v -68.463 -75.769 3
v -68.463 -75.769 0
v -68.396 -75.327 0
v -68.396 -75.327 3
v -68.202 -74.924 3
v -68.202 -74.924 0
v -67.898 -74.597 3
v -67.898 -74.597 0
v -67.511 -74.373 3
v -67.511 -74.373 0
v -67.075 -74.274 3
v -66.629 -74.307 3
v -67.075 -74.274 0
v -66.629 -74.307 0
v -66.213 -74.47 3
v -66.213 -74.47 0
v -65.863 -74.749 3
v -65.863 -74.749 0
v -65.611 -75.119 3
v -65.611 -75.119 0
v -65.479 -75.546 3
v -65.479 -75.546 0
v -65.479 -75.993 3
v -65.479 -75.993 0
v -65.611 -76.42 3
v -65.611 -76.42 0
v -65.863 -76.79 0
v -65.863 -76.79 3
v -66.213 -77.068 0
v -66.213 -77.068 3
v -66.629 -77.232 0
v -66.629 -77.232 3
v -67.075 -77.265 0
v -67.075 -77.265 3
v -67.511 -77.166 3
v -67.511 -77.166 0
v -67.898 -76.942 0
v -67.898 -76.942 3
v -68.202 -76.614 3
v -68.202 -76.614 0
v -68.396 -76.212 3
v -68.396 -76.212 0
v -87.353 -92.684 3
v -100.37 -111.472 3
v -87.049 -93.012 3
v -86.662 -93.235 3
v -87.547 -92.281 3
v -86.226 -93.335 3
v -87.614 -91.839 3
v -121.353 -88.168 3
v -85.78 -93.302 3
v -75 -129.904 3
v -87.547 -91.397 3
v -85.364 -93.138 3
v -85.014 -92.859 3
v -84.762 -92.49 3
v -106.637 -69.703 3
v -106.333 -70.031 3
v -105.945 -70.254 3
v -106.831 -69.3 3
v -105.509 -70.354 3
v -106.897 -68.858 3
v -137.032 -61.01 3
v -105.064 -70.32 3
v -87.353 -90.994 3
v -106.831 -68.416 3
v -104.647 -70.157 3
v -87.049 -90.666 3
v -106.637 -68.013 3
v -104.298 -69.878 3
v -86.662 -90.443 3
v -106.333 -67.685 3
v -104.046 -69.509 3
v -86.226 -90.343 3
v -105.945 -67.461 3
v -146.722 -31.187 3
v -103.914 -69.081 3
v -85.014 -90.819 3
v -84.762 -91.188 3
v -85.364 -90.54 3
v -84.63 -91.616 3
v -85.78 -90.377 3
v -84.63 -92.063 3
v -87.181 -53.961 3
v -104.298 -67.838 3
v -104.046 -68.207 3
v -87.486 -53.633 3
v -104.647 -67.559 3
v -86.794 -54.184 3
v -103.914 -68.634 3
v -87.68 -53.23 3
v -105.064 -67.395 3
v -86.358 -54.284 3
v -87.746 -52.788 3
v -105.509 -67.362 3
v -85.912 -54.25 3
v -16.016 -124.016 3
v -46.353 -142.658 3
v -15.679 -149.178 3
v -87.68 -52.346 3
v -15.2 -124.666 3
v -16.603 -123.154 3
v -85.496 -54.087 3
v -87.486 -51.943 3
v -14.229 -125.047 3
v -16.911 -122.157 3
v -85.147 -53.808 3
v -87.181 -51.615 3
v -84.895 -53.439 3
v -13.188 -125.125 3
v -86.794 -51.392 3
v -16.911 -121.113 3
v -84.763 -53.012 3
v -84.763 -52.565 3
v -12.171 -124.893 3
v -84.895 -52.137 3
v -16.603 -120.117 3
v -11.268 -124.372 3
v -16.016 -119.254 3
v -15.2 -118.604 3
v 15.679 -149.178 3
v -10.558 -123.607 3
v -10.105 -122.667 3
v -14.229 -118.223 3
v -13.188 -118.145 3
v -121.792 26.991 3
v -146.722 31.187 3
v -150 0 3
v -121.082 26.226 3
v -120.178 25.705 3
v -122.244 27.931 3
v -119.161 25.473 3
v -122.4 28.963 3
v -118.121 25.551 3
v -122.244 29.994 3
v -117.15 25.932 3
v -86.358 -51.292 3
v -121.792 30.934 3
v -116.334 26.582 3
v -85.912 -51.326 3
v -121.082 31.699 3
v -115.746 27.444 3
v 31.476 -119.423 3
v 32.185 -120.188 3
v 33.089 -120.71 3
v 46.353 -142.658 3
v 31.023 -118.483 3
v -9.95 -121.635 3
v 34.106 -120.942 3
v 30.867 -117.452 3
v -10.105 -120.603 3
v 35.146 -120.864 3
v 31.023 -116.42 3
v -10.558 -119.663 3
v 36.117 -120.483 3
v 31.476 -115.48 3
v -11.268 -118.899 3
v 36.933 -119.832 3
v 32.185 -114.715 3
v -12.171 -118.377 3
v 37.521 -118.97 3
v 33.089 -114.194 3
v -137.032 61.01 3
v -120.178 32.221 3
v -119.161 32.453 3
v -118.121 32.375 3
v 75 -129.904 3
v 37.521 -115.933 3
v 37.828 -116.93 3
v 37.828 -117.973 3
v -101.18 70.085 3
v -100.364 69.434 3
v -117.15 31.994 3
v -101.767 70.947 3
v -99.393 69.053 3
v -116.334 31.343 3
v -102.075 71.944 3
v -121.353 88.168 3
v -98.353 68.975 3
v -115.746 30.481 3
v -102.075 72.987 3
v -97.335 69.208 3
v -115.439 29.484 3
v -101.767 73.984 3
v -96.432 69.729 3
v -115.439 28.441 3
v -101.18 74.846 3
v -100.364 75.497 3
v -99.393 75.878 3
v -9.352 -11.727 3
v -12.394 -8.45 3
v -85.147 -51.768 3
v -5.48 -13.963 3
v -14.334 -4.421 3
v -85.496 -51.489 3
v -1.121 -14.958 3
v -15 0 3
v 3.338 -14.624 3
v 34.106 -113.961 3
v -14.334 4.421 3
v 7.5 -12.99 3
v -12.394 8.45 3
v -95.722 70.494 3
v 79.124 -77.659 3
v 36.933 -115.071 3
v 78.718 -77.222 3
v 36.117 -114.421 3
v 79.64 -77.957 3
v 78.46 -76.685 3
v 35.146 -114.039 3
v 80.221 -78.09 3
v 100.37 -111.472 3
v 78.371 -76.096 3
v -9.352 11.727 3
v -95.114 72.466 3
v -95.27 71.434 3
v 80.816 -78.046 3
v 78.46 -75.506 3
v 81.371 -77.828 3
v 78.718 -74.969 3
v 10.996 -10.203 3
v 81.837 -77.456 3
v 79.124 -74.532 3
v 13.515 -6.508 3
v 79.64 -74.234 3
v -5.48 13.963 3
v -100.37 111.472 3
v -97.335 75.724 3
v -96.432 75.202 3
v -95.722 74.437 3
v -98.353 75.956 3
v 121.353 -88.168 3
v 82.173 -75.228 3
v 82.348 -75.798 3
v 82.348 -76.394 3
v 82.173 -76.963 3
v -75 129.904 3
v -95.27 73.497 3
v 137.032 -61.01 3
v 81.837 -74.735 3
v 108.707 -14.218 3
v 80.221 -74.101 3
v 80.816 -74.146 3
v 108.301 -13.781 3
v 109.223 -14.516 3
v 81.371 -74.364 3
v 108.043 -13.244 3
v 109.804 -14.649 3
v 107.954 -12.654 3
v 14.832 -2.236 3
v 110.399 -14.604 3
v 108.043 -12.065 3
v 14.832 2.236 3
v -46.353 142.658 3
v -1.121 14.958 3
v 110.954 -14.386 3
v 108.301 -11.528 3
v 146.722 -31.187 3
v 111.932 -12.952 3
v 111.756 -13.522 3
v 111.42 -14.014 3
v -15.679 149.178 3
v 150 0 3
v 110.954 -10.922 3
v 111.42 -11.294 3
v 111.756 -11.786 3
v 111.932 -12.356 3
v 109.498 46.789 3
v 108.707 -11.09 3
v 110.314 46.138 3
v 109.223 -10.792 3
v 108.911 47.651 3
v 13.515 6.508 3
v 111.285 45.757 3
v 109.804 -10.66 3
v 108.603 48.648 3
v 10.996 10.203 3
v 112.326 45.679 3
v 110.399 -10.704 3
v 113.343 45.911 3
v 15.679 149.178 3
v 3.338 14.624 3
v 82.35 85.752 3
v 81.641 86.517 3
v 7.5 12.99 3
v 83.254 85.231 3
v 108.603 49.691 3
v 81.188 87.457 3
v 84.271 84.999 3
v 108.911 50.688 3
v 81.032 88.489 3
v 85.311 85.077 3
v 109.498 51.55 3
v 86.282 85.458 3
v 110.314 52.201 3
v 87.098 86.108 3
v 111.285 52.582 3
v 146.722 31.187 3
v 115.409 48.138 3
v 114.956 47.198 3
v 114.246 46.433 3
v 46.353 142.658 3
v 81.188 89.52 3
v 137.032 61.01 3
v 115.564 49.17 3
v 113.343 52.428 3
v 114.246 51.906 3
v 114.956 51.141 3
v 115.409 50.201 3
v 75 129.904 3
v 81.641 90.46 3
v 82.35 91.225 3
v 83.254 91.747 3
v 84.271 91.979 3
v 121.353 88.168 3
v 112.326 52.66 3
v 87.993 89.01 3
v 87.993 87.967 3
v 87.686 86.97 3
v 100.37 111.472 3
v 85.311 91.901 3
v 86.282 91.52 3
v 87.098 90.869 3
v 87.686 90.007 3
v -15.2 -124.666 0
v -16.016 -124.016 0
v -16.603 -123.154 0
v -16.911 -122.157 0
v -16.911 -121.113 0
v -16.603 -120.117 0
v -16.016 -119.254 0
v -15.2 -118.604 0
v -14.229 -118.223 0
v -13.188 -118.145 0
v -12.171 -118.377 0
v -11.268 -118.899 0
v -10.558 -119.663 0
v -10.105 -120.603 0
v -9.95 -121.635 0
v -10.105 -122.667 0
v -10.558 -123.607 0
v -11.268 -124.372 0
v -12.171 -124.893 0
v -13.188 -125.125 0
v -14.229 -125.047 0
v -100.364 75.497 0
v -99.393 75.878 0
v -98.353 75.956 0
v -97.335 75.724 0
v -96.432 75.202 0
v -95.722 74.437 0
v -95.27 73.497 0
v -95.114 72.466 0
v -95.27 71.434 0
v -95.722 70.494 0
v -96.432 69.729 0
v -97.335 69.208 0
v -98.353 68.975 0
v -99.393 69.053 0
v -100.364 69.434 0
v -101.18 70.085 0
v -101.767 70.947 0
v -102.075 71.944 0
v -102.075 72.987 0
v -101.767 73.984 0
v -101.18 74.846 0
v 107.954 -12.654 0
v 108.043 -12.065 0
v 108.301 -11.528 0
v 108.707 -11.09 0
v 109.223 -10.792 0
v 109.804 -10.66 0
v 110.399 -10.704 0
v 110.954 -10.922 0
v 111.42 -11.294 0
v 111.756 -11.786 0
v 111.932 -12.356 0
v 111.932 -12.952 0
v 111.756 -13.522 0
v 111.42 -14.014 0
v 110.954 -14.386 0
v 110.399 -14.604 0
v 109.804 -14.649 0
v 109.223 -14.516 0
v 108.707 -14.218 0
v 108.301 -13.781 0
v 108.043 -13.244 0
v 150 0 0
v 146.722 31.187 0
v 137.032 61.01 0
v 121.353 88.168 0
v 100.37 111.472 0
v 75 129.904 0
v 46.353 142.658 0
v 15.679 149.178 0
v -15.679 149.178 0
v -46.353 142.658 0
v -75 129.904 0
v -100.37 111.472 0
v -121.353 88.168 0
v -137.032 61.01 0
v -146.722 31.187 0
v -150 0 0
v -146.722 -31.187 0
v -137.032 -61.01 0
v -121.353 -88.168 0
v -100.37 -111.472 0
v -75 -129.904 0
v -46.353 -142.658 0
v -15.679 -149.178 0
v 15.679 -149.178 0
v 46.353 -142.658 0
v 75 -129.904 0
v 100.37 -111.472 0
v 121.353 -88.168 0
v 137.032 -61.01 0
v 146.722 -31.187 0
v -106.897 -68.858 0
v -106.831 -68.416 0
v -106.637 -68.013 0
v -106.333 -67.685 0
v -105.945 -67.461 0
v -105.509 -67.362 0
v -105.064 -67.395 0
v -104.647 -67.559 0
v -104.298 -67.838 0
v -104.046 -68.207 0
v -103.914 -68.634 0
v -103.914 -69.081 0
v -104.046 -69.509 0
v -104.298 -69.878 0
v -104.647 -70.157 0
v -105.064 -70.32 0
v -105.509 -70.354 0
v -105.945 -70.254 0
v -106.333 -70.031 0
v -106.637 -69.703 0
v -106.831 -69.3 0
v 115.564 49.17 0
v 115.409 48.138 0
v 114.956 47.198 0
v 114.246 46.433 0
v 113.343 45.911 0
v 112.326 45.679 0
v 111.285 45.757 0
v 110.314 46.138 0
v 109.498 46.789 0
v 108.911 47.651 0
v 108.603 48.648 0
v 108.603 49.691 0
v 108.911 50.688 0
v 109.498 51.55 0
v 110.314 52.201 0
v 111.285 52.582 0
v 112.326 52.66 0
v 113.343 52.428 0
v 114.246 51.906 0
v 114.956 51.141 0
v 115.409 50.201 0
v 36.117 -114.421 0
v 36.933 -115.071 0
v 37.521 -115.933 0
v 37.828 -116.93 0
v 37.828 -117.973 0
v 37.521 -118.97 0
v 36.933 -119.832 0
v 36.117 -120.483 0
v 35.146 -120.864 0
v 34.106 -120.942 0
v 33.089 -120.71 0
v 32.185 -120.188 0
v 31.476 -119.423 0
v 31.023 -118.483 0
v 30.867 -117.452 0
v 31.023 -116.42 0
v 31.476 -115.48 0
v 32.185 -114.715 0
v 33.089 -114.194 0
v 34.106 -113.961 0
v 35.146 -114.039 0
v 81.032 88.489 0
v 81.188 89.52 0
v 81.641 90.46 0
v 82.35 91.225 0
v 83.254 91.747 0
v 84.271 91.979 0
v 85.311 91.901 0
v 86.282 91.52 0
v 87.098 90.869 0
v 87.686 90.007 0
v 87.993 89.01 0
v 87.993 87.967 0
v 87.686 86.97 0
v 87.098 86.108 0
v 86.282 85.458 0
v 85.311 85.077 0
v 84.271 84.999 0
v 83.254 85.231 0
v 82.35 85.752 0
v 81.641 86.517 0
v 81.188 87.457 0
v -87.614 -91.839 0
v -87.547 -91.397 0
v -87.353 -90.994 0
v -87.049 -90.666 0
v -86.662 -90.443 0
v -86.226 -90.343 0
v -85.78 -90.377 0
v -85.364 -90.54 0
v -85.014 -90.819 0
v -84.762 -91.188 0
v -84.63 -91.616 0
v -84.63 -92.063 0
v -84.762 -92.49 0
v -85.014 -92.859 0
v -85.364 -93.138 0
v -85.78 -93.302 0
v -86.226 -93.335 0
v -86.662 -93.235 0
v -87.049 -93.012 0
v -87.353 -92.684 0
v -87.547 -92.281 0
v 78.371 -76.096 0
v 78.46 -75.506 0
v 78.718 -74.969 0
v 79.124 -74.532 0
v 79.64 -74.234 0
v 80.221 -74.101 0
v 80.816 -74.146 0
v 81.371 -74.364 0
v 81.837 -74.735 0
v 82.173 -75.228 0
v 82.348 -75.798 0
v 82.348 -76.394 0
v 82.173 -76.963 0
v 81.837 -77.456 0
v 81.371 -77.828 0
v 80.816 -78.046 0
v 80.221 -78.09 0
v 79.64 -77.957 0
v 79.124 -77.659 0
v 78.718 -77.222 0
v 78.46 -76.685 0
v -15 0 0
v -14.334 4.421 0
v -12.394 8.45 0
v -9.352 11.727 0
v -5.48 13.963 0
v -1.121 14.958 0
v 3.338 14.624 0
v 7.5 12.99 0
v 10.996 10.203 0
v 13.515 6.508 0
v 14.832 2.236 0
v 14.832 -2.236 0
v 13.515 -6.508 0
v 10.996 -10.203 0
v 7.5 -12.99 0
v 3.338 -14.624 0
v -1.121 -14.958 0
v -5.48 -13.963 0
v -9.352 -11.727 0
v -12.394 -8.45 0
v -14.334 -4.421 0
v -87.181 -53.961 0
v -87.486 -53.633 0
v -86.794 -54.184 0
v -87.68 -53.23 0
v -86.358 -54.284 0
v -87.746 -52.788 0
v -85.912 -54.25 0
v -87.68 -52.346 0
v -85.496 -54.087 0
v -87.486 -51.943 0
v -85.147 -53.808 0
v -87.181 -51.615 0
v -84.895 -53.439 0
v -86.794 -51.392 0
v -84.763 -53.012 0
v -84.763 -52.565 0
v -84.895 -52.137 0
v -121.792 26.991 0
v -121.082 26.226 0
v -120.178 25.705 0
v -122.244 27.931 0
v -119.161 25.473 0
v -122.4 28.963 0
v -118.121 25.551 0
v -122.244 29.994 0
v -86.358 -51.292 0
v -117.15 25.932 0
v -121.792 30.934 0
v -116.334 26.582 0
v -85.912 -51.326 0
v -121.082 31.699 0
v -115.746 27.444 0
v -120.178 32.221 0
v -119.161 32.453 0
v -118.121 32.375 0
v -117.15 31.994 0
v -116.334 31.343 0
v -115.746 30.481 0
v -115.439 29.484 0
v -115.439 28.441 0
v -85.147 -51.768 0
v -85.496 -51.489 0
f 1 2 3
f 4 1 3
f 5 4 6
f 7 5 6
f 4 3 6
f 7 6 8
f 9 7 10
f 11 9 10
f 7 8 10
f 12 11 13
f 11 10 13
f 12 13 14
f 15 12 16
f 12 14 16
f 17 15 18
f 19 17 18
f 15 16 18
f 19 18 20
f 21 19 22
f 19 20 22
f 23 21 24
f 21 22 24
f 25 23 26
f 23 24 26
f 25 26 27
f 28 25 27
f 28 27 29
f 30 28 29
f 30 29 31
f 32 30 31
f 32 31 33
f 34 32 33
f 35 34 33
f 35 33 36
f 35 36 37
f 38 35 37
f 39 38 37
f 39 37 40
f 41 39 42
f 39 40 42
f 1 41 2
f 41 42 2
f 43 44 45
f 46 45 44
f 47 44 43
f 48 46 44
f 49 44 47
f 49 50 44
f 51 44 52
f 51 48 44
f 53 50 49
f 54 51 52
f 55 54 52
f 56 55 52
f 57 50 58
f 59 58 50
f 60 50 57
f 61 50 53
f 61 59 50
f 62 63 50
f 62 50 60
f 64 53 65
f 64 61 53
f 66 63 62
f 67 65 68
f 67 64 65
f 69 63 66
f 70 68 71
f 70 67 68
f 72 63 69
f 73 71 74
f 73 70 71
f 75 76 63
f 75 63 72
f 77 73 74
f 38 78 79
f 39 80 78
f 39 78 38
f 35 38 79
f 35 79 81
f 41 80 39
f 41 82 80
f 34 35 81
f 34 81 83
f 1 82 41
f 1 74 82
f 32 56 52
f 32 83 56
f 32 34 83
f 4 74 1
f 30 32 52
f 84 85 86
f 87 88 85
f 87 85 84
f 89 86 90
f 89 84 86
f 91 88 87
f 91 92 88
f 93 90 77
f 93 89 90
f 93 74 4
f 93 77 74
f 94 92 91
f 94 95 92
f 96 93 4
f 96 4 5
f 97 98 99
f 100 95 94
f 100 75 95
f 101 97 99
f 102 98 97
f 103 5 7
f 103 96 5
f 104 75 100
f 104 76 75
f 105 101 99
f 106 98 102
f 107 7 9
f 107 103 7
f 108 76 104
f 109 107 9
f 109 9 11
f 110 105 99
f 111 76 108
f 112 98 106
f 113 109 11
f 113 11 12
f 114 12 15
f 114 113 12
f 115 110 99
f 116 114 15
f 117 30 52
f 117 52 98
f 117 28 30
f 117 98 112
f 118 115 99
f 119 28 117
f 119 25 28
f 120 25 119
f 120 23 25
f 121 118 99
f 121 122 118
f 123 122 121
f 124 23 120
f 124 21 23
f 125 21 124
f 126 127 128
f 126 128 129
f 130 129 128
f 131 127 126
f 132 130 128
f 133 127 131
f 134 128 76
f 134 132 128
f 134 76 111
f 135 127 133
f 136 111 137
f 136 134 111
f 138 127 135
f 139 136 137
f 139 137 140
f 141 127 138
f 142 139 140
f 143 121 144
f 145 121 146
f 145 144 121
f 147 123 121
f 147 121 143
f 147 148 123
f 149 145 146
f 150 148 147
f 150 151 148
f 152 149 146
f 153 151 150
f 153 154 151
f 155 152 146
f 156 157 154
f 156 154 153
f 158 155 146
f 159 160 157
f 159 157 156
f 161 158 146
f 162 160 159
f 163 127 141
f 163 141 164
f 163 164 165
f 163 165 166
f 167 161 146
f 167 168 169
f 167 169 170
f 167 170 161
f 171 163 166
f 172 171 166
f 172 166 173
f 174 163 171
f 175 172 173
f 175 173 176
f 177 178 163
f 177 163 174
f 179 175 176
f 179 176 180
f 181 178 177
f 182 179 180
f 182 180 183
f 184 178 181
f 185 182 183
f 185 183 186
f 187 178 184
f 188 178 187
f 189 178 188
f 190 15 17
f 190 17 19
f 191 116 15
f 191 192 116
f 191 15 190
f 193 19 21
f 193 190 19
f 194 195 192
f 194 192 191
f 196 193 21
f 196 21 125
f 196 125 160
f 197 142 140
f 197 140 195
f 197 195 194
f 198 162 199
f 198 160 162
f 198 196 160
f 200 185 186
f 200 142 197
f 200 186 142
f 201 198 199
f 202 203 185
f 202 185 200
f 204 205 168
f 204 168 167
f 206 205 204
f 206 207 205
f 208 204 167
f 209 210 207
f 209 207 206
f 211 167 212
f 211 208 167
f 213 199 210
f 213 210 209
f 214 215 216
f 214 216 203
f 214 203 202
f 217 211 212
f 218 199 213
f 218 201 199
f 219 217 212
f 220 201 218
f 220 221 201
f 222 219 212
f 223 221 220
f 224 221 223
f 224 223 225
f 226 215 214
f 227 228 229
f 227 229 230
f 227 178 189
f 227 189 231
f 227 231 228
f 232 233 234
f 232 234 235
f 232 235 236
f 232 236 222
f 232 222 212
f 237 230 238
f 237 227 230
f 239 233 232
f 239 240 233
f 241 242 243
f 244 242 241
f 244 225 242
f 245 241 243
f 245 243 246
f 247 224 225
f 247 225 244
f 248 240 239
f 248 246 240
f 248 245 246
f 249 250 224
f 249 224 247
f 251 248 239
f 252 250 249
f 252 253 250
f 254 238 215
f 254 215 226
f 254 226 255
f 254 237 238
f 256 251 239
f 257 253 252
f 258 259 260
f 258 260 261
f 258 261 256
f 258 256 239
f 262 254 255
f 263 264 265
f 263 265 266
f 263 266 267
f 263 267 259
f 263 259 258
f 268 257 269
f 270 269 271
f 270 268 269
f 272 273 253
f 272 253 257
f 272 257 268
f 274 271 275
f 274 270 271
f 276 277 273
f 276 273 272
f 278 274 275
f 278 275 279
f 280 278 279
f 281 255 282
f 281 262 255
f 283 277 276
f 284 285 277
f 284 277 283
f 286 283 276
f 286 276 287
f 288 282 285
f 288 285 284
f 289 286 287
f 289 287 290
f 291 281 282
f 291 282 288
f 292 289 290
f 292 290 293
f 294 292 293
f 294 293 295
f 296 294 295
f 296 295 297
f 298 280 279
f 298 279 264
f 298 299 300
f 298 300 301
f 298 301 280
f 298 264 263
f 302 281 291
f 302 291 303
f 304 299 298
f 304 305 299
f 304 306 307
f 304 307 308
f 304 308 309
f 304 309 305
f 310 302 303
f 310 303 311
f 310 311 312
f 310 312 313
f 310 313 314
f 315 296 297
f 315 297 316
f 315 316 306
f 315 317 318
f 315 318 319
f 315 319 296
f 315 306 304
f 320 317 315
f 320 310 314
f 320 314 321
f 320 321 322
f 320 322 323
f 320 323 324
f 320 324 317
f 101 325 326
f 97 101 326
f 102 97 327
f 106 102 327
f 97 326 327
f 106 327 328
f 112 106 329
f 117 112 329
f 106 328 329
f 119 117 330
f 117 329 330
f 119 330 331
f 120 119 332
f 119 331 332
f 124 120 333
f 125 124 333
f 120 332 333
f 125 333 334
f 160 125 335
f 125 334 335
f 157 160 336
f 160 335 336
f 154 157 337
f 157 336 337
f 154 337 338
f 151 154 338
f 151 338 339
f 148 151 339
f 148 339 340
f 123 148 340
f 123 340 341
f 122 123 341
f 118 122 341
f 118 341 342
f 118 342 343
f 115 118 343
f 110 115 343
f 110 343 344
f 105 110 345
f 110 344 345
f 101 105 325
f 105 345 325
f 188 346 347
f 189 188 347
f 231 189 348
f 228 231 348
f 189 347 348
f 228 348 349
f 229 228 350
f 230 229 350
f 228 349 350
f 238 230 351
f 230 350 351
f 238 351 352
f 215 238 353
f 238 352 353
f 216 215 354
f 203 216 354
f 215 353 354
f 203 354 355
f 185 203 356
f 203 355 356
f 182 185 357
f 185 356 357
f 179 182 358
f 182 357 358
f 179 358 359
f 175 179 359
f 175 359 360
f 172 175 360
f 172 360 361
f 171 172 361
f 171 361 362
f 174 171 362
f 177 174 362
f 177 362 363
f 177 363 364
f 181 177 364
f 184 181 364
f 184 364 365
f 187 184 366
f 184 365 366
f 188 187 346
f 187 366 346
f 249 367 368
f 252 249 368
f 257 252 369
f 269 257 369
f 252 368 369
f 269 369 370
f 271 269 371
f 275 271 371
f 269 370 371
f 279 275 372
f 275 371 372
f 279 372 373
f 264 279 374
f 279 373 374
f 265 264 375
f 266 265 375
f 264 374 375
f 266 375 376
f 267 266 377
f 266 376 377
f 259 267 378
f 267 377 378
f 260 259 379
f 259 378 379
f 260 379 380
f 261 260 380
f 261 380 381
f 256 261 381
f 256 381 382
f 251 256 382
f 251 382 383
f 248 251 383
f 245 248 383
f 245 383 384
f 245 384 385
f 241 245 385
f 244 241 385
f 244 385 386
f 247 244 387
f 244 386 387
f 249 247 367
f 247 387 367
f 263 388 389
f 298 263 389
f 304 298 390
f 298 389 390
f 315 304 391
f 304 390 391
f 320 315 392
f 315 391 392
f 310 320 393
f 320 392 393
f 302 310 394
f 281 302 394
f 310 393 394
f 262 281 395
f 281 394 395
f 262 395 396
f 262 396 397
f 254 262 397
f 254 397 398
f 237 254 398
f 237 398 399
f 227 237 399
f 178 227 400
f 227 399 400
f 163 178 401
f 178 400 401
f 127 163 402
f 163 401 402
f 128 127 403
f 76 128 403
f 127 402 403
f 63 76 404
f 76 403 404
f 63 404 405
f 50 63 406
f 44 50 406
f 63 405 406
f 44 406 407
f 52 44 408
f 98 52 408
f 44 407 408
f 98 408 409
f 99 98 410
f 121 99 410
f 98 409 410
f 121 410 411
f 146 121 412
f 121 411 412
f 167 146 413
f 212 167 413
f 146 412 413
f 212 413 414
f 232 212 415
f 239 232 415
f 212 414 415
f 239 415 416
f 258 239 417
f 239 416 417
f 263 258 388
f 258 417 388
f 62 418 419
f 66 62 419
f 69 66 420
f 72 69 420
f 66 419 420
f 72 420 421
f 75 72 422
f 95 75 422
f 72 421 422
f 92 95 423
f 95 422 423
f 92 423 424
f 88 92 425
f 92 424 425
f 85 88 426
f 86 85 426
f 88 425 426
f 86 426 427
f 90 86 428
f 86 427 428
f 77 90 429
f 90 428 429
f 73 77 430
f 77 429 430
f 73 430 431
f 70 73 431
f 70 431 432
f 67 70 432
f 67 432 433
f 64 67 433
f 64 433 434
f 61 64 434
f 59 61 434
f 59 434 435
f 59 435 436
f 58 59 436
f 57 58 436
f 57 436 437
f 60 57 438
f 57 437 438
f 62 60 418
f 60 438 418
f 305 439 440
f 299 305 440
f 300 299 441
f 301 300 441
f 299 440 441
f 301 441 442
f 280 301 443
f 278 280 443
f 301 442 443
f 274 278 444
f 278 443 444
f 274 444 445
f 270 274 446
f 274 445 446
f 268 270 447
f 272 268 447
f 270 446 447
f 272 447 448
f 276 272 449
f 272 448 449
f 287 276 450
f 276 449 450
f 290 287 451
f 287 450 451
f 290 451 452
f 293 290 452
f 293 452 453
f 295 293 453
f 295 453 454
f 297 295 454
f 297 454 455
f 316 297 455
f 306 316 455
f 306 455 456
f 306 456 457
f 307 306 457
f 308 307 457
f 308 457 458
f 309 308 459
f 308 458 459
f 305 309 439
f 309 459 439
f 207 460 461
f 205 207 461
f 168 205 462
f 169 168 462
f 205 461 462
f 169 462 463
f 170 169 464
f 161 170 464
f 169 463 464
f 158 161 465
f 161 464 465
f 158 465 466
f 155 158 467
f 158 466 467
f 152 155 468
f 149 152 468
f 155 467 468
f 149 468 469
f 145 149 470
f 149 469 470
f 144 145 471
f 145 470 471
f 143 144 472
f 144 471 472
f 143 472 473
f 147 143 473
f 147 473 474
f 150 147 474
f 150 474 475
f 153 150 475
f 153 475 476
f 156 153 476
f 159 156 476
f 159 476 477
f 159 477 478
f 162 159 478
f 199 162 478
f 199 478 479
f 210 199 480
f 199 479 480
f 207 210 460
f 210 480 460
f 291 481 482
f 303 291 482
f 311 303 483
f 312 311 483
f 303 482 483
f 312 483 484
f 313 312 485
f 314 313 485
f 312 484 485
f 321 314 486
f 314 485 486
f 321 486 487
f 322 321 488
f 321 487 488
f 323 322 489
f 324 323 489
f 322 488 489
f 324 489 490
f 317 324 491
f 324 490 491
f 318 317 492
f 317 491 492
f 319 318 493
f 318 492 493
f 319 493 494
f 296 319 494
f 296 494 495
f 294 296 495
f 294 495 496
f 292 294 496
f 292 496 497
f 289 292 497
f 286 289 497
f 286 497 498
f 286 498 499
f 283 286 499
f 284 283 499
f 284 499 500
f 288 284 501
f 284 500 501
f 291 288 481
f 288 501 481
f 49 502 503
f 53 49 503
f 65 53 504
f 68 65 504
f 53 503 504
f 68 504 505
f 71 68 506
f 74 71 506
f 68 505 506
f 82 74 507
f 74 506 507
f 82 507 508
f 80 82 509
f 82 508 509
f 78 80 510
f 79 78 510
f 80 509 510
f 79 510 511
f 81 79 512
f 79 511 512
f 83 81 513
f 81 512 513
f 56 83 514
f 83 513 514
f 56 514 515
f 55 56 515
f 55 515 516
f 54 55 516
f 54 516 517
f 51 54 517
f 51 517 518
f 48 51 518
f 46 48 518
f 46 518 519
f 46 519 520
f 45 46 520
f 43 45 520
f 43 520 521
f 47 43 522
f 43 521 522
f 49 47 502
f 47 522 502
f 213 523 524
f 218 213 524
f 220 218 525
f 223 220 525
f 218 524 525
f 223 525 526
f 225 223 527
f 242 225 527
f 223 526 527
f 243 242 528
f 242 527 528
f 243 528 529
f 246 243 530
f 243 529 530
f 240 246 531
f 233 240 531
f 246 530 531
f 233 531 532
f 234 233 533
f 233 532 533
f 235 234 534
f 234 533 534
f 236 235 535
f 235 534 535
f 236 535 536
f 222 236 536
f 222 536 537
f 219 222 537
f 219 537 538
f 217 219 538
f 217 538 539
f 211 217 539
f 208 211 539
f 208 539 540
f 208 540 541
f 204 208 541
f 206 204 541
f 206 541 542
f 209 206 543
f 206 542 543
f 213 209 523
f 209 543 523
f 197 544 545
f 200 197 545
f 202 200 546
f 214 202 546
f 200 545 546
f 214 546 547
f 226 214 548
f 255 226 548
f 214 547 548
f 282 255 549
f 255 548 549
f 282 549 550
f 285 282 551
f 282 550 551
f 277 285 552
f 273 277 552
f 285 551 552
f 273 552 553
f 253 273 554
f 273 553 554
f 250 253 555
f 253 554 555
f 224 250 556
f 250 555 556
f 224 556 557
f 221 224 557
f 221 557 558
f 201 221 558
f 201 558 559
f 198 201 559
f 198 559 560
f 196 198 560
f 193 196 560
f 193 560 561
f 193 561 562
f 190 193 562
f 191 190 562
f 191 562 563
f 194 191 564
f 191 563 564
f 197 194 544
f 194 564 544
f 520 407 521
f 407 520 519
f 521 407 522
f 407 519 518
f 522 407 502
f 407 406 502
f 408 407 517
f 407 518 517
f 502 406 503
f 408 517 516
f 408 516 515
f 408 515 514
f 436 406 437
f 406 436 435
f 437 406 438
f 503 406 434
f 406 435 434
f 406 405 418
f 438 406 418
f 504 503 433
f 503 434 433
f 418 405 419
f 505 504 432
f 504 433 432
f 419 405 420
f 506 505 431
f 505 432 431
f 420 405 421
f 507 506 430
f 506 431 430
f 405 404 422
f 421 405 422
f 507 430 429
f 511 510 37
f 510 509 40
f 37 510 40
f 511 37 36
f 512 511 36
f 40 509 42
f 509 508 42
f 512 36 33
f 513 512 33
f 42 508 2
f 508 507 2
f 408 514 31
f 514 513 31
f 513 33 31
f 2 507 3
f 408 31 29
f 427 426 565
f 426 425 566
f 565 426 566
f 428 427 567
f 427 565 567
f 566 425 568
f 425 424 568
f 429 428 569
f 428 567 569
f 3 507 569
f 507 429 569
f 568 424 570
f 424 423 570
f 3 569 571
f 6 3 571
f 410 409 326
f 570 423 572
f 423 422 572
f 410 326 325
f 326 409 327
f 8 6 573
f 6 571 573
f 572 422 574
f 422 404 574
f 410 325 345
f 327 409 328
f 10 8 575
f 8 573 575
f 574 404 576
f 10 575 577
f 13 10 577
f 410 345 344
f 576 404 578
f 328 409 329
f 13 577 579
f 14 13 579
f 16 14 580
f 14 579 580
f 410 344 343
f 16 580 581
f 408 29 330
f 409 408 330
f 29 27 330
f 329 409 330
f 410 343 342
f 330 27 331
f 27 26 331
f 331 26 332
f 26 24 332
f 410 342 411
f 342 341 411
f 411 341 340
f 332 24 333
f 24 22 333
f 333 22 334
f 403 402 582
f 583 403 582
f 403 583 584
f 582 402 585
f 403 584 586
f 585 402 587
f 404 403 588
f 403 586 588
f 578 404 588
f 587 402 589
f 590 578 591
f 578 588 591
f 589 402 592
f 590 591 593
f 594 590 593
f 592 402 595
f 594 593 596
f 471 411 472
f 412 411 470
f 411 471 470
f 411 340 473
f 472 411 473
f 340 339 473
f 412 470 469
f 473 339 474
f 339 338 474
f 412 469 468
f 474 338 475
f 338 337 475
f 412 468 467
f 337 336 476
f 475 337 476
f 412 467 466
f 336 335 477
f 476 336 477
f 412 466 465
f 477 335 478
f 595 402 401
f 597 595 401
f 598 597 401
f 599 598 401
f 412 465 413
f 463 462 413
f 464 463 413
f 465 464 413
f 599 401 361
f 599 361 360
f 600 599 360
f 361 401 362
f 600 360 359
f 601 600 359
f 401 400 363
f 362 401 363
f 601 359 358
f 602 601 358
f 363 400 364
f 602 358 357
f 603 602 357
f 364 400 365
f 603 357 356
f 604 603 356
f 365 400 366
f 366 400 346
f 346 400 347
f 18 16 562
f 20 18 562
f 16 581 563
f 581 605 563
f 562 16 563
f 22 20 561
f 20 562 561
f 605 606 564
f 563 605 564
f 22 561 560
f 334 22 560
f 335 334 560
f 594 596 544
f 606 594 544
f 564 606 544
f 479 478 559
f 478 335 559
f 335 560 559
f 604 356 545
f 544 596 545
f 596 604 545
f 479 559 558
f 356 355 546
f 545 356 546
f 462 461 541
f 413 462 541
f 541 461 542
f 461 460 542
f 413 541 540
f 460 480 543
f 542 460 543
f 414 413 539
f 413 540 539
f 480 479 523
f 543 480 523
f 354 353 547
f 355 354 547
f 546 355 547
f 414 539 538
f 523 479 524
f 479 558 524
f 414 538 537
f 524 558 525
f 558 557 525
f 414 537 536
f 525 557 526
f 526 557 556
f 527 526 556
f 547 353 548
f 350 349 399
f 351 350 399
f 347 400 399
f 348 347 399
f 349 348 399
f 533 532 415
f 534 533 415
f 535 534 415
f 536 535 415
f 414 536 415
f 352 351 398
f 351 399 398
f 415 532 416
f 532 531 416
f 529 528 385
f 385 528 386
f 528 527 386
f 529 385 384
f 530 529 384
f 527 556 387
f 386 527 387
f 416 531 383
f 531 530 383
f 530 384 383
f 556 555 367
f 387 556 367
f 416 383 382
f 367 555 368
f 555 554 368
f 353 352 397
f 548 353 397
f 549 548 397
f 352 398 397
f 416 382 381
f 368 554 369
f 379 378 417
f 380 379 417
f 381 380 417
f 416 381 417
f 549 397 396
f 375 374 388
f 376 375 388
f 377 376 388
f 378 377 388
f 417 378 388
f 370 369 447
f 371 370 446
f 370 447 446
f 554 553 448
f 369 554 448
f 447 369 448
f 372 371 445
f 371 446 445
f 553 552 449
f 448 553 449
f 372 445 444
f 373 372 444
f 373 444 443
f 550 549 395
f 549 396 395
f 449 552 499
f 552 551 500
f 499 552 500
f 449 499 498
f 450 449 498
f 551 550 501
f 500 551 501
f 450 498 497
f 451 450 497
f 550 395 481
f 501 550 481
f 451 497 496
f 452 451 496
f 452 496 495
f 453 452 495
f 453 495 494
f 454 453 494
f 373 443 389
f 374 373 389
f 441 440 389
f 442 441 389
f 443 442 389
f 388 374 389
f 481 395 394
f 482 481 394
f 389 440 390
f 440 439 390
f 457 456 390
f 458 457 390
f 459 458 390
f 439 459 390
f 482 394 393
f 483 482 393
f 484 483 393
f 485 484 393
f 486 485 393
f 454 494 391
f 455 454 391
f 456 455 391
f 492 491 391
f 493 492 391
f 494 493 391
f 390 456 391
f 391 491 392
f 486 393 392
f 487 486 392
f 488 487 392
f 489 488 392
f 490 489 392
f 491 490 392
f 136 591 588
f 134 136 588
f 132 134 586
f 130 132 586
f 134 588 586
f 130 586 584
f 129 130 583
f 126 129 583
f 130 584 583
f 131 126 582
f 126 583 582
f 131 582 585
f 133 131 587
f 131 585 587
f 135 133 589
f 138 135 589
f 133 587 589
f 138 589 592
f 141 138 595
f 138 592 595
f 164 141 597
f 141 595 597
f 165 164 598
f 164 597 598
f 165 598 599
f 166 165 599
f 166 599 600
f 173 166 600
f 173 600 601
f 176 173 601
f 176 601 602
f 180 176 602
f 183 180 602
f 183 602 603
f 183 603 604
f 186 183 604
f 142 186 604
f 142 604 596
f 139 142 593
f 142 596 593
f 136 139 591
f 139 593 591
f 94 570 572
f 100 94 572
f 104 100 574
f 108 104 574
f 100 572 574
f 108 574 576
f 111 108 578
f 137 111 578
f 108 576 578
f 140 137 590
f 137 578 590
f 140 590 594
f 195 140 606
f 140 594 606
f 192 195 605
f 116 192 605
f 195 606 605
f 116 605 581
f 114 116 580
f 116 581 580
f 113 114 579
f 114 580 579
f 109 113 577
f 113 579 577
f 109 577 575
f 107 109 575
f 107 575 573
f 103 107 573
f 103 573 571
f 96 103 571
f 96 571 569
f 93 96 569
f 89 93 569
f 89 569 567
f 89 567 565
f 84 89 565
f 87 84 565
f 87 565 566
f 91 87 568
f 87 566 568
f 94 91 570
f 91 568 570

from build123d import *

# Parameters (mm, degrees)
SKETCH1_R           = 150
BOSS_EXTRUDE1_DEPTH = 3
SKETCH2_R           = 3.5
CUT_EXTRUDE1_DEPTH  = 3
CIRPATTERN1_COUNT   = 3
SKETCH3_R           = 2
CUT_EXTRUDE2_DEPTH  = 3
SKETCH4_R           = 15
CUT_EXTRUDE3_DEPTH  = 3
SKETCH6_R           = 1.5
CUT_EXTRUDE5_DEPTH  = 3


with BuildPart() as part:
    # Sketch1 → Boss-Extrude1 (new body)
    with BuildSketch(Plane.XY):
        Circle(SKETCH1_R)
    extrude(amount=BOSS_EXTRUDE1_DEPTH)

    # Sketch2 → Cut-Extrude1 (cut)
    with BuildSketch(Plane(origin=(0, 0, 0), x_dir=(-1, 0, 0), z_dir=(0, 0, -1))):
        with Locations((-84.532410842, 88.488821425)):
            Circle(SKETCH2_R)
        with Locations(Location((-112.064079787, 49.169523299, 0), (0, 0, 180))):
            Circle(SKETCH2_R)
    cut_extrude1 = extrude(amount=-CUT_EXTRUDE1_DEPTH, mode=Mode.SUBTRACT)

    # CirPattern1: Cut-Extrude1 ×3 about axis
    cirpattern1_axis = Axis((0, 0, 0), (0, 0, 1))
    for i in range(1, CIRPATTERN1_COUNT):
        add(cut_extrude1.rotate(cirpattern1_axis, i * 360 / CIRPATTERN1_COUNT), mode=Mode.SUBTRACT)

    # Sketch3 → Cut-Extrude2 (cut)
    with BuildSketch(Plane(origin=(0, 0, 0), x_dir=(-1, 0, 0), z_dir=(0, 0, -1))):
        with Locations((-109.9539568, -12.654144936)):
            Circle(SKETCH3_R)
        with Locations((-80.370678478, -76.095690029)):
            Circle(SKETCH3_R)
    extrude(amount=-CUT_EXTRUDE2_DEPTH, mode=Mode.SUBTRACT)

    # Sketch4 → Cut-Extrude3 (cut)
    with BuildSketch(Plane(origin=(0, 0, 0), x_dir=(-1, 0, 0), z_dir=(0, 0, -1))):
        Circle(SKETCH4_R)
    extrude(amount=-CUT_EXTRUDE3_DEPTH, mode=Mode.SUBTRACT)

    # Sketch6 → Cut-Extrude5 (cut)
    with BuildSketch(Plane(origin=(0, 0, 0), x_dir=(-1, 0, 0), z_dir=(0, 0, -1))):
        with Locations((66.962630167, -75.769427615)):
            Circle(SKETCH6_R)
        with Locations((86.113741245, -91.839117858)):
            Circle(SKETCH6_R)
        with Locations((105.397369535, -68.857784564)):
            Circle(SKETCH6_R)
        with Locations((86.246258457, -52.788094322)):
            Circle(SKETCH6_R)
    extrude(amount=-CUT_EXTRUDE5_DEPTH, mode=Mode.SUBTRACT)


solid = part.part
